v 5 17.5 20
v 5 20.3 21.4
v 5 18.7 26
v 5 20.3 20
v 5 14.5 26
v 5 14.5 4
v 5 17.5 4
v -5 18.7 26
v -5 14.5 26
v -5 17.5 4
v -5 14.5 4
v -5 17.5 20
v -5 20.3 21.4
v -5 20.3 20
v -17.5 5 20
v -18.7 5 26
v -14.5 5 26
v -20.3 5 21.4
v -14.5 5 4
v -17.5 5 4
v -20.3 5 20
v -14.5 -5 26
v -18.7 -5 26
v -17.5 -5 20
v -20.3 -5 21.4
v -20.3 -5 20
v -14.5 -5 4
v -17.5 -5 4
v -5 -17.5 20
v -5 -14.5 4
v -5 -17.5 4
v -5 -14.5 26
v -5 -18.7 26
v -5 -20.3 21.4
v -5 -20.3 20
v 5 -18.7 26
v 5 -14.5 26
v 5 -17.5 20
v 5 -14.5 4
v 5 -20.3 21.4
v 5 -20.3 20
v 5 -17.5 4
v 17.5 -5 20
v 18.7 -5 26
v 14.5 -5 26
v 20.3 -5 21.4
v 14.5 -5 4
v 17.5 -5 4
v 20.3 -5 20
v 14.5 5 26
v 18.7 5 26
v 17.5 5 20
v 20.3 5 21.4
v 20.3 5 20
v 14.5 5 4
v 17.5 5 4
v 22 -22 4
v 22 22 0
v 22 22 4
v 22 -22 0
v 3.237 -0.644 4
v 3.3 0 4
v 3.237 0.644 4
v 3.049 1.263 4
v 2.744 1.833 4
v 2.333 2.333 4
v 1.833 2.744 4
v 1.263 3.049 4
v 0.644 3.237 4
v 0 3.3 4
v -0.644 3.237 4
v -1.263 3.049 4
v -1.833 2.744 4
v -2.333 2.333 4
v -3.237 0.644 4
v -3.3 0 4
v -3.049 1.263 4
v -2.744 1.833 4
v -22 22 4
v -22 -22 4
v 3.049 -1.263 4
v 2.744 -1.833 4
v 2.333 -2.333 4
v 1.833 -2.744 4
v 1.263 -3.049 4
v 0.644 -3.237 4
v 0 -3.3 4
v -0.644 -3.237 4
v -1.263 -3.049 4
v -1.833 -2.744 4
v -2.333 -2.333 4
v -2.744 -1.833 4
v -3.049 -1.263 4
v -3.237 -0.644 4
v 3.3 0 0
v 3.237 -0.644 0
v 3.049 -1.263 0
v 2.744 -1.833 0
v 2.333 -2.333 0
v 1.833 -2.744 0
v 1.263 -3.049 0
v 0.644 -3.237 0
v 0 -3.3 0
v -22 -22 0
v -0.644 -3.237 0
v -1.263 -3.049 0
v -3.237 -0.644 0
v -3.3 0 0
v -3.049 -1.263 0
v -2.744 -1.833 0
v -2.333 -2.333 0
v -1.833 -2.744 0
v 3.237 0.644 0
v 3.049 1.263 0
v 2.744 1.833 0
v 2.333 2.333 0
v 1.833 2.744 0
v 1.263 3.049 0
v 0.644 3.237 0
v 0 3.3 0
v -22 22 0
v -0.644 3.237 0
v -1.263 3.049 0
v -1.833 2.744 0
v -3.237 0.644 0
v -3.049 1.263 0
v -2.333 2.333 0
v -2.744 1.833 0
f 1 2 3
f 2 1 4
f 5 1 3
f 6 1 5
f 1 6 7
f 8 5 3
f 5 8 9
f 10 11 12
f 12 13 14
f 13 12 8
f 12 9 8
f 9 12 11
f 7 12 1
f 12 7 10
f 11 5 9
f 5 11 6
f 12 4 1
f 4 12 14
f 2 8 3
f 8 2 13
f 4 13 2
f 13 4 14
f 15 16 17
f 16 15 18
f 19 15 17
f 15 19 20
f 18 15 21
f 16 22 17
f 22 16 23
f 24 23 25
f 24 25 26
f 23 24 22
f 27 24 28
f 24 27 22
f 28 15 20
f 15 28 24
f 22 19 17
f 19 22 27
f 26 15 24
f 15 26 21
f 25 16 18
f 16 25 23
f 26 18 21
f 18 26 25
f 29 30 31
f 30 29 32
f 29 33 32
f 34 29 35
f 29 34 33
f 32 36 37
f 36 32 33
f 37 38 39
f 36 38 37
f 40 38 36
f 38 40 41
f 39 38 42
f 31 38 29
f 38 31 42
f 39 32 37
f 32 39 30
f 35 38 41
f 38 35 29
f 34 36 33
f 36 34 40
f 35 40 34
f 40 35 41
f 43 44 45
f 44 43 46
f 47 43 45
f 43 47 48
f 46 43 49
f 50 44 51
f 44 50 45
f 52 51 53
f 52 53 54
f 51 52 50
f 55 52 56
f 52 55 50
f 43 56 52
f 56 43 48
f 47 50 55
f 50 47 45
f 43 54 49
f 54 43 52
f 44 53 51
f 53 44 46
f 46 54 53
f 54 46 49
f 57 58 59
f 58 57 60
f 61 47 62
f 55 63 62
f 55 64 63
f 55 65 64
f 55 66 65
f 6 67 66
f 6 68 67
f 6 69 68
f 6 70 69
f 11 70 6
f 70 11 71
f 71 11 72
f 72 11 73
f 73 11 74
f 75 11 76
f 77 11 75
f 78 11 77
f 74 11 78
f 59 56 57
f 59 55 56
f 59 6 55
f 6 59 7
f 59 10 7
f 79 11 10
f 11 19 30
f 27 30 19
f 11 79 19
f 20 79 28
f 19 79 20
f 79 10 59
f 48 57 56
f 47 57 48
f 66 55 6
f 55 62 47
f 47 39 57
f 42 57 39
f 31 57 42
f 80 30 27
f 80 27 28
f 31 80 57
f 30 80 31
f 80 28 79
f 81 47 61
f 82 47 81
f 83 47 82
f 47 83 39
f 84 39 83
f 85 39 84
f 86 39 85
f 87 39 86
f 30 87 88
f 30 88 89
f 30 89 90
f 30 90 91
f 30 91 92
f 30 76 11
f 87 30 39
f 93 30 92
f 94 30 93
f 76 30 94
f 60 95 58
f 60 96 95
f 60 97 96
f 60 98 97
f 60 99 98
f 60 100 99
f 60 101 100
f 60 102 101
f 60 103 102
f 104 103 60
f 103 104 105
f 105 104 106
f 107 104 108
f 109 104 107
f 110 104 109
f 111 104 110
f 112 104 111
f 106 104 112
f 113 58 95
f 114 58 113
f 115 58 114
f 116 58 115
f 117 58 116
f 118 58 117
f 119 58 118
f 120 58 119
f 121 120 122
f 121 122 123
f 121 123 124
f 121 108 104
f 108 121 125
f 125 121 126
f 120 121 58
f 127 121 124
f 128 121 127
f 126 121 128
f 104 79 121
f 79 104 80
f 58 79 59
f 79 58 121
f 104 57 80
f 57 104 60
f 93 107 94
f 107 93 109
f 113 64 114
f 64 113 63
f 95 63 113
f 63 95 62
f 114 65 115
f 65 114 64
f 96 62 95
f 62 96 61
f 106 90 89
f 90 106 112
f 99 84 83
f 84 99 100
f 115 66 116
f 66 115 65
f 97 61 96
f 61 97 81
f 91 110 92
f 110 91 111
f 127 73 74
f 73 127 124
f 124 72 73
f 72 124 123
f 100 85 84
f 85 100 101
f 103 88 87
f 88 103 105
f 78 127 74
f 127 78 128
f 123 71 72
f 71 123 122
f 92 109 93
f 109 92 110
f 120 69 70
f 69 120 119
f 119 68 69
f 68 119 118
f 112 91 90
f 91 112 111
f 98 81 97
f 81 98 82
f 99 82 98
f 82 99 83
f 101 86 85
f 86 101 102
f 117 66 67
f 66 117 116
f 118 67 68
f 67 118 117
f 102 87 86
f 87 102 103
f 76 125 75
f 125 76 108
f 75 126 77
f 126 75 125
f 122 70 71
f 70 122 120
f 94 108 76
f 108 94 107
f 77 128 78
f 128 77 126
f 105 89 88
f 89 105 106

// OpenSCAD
$fn = 32;

// ----------------------------------------------------------------------
// Snap-fit latch: 4 arms, 22 mm tall, 3 mm undercut hooks
// ----------------------------------------------------------------------

// --- parameters (mm) ---
base_d = 44;              // base plate depth
base_h = 4;               // base plate thickness
span = 32;                // distance between opposite arms
arm_t = 3;                // arm thickness
arm_d = 10;               // arm width
height = 22;              // free arm length
head_len = 3;             // hook reach
head_h = 6;               // hook height
lead = 1.4;               // lead-in ramp thickness
bore_d = 6.6;             // base fixing bore
top_z = 26;               // height of the arm tips above the base

arms = 4;

difference() {
  union() {
    /* base plate, centred on the arm ring */
    translate([-22, -22, 0]) cube([base_d, base_d, base_h]);
    for (a = [0 : 360 / arms : 359]) rotate([0, 0, a]) {
    /* arm, sunk 0.5 mm into the base */
    translate([-arm_d / 2, span / 2 - arm_t / 2, base_h - 0.5]) cube([arm_d, arm_t, height + 0.5]);
    /* hook: a convex hull of a tall inner block and a thin outer lip
       gives a flat undercut below and a lead-in ramp on top */
    hull() {
      translate([-arm_d / 2, span / 2 + arm_t / 2 - 0.6, top_z - head_h]) cube([arm_d, lead + 0.4, head_h]);
      translate([-arm_d / 2, span / 2 + arm_t / 2 - 0.2, top_z - head_h]) cube([arm_d, head_len, lead]);
    }
    }
  }
  translate([0, 0, -2.5]) cylinder(h = base_h + 5, d = bore_d);
}
